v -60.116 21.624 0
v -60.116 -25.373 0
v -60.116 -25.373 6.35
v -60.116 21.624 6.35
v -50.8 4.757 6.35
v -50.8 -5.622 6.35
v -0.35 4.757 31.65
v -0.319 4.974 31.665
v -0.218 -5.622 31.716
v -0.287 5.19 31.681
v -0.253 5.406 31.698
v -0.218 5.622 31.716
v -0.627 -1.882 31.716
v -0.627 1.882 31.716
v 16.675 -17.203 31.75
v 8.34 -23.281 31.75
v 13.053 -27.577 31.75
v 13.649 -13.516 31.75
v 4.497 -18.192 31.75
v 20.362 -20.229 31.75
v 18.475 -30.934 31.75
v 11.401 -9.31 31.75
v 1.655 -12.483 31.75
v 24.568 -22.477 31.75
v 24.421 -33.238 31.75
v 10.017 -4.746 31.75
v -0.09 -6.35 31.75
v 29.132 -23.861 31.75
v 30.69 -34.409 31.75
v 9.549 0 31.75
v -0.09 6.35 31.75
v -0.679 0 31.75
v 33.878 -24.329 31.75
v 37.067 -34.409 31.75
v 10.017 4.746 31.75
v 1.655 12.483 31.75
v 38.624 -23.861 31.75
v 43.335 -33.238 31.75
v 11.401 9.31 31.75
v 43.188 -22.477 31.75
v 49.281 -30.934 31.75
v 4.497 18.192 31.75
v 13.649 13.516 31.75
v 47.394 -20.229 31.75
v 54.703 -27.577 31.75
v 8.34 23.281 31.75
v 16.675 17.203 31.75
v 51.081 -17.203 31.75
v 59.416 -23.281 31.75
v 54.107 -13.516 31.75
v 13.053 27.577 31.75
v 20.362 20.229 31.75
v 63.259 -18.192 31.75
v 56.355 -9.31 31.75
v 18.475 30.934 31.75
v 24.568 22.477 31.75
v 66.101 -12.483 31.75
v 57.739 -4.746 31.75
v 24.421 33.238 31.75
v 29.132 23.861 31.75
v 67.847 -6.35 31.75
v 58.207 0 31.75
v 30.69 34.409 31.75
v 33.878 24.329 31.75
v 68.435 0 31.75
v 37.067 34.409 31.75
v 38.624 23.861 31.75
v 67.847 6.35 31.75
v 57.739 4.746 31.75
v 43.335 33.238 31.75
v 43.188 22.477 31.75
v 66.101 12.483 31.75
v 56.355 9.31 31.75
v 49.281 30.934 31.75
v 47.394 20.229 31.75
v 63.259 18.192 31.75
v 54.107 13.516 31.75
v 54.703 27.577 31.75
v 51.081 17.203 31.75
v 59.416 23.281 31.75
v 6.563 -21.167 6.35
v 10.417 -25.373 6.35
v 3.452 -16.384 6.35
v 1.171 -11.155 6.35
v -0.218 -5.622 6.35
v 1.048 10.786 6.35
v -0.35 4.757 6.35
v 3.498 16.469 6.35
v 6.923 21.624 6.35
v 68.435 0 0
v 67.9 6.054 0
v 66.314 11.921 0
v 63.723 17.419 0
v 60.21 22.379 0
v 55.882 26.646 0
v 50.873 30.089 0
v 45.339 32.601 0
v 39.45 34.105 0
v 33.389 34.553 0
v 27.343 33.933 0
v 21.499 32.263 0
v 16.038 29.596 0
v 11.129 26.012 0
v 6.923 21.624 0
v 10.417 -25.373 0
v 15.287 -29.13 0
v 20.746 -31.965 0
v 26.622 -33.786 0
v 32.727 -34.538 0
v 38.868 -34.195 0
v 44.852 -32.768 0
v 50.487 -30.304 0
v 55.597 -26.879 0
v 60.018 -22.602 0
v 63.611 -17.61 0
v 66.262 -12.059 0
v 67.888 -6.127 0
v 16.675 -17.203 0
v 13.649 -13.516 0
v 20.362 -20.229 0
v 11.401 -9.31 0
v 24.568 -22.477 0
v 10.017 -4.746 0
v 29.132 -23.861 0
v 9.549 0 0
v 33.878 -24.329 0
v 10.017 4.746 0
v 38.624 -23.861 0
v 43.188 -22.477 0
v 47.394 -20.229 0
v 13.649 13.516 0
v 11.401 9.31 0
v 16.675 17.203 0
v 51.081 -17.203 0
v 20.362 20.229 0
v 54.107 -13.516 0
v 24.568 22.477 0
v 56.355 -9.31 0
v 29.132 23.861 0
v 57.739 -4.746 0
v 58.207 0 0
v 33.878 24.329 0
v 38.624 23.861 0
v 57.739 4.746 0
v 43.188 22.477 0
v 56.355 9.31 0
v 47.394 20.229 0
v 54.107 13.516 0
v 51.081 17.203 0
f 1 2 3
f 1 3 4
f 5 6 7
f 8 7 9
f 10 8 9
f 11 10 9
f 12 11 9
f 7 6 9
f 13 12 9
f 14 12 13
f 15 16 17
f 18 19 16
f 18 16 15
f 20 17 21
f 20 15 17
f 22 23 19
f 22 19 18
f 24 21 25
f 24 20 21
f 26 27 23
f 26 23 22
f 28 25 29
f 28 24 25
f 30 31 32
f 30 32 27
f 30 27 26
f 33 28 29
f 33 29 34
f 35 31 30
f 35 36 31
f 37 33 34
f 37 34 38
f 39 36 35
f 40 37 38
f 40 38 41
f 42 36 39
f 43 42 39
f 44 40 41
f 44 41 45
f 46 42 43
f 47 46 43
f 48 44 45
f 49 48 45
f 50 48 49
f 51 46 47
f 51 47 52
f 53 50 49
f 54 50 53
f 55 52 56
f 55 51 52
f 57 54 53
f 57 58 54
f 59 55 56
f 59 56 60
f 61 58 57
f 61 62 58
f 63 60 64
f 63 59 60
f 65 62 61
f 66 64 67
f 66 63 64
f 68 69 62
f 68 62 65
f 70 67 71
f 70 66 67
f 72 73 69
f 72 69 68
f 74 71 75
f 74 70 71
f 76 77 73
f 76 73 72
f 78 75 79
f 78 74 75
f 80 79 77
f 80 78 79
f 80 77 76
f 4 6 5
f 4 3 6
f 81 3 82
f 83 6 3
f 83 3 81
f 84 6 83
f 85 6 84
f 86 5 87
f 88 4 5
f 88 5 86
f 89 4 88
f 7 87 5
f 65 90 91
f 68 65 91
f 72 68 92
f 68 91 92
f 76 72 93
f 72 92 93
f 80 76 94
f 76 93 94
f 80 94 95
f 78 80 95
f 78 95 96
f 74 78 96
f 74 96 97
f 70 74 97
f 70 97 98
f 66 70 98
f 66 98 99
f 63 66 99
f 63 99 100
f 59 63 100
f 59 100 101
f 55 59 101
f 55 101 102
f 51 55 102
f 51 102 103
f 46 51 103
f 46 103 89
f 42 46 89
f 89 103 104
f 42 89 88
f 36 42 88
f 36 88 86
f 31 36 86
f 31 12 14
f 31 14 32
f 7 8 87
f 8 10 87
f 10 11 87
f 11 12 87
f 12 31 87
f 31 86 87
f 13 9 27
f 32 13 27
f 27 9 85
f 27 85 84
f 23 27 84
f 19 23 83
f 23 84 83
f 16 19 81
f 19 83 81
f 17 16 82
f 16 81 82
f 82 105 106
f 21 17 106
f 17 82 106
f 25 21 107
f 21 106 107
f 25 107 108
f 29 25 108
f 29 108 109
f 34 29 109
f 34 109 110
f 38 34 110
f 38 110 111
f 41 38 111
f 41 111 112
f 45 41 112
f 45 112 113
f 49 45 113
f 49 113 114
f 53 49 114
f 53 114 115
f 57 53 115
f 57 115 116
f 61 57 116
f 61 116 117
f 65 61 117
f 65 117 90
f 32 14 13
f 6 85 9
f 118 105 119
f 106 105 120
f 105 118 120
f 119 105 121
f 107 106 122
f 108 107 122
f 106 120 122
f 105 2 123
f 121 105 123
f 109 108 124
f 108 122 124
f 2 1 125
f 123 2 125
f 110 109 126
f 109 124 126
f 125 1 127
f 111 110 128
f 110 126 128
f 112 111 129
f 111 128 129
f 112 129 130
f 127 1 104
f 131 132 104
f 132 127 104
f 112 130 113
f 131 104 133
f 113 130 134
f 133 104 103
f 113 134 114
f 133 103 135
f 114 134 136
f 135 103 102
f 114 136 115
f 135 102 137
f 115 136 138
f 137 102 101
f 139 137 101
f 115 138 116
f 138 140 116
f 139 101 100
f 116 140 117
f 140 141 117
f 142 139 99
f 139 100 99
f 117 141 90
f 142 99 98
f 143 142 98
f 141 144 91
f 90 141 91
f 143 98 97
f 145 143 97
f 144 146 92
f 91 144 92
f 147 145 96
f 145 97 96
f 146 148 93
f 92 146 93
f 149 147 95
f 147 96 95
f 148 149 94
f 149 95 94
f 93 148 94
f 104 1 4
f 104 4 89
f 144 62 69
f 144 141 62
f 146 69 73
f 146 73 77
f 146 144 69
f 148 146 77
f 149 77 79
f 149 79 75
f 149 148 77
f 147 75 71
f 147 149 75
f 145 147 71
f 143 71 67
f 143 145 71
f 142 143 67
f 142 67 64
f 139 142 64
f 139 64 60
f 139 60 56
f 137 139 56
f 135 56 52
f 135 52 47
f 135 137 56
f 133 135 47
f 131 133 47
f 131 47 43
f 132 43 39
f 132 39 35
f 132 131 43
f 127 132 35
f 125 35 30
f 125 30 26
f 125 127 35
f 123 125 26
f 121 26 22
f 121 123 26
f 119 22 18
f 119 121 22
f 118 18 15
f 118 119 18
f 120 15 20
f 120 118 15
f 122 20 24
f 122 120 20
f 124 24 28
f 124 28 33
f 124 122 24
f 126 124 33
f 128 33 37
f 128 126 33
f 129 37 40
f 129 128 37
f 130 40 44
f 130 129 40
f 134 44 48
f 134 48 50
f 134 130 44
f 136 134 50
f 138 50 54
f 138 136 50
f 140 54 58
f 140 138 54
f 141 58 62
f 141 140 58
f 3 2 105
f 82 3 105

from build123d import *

# Parameters (mm, degrees)
F0_R      = 34.5568436117
F0_R_2    = 24.3288327677
F1_DEPTH  = 50.8
F2_W      = 74.3876788765
F2_H      = 46.9968635589
F3_DEPTH  = 25.4
F4_DEPTH  = 19.05
F5_DEPTH  = 19.05
F6_DEPTH  = 50.8
F7_W      = 10.3796771728
F7_H      = 25.9491894394
F8_DEPTH  = 50.8
F10_DEPTH = 76.2


with BuildPart() as f1:
    # F0 (on Top) → F1 (new body)
    with BuildSketch(Plane.XY):
        with Locations((33.8781066239, 0)):
            Circle(F0_R)
        with Locations((33.8781066239, 0)):
            Circle(F0_R_2, mode=Mode.SUBTRACT)
    extrude(amount=F1_DEPTH)

    # F2 (on Top) → F3 (join)
    with BuildSketch(Plane.XY):
        with Locations((-22.9217847809, -1.8741087988)):
            Rectangle(F2_W, F2_H)
    extrude(amount=F3_DEPTH)

    # F4 (cut): a face of the model
    f4_faces = [f1.faces().sort_by_distance(p)[0] for p in [
        (0.2986781504, 0, 50.8),
    ]]
    extrude(f4_faces, amount=-F4_DEPTH, mode=Mode.SUBTRACT)

    # F5 (cut): a face of the model
    f5_faces = [f1.faces().sort_by_distance(p)[0] for p in [
        (-28.8538449791, -2.0648821255, 25.4),
    ]]
    extrude(f5_faces, amount=-F5_DEPTH, mode=Mode.SUBTRACT)

    # F6 (cut): a face of the model
    f6_faces = [f1.faces().sort_by_distance(p)[0] for p in [
        (12.3662875308, 0, 25.4),
    ]]
    extrude(f6_faces, amount=-F6_DEPTH, mode=Mode.SUBTRACT)

    # F7 (on Right) → F8 (join)
    with BuildSketch(Plane.YZ):
        with Locations((-0.4324859474, 18.7410814688)):
            Rectangle(F7_W, F7_H)
    extrude(amount=-F8_DEPTH)

    # F9 (on face) → F10 (cut)
    with BuildSketch(Plane.XZ.offset(5.6223245338)):
        Polygon((-50.8, 6.35), (-0.2182994512, 31.7156761885), (-50.8, 31.7156761885), align=None)
    extrude(amount=-F10_DEPTH, mode=Mode.SUBTRACT)


solid = f1.part
